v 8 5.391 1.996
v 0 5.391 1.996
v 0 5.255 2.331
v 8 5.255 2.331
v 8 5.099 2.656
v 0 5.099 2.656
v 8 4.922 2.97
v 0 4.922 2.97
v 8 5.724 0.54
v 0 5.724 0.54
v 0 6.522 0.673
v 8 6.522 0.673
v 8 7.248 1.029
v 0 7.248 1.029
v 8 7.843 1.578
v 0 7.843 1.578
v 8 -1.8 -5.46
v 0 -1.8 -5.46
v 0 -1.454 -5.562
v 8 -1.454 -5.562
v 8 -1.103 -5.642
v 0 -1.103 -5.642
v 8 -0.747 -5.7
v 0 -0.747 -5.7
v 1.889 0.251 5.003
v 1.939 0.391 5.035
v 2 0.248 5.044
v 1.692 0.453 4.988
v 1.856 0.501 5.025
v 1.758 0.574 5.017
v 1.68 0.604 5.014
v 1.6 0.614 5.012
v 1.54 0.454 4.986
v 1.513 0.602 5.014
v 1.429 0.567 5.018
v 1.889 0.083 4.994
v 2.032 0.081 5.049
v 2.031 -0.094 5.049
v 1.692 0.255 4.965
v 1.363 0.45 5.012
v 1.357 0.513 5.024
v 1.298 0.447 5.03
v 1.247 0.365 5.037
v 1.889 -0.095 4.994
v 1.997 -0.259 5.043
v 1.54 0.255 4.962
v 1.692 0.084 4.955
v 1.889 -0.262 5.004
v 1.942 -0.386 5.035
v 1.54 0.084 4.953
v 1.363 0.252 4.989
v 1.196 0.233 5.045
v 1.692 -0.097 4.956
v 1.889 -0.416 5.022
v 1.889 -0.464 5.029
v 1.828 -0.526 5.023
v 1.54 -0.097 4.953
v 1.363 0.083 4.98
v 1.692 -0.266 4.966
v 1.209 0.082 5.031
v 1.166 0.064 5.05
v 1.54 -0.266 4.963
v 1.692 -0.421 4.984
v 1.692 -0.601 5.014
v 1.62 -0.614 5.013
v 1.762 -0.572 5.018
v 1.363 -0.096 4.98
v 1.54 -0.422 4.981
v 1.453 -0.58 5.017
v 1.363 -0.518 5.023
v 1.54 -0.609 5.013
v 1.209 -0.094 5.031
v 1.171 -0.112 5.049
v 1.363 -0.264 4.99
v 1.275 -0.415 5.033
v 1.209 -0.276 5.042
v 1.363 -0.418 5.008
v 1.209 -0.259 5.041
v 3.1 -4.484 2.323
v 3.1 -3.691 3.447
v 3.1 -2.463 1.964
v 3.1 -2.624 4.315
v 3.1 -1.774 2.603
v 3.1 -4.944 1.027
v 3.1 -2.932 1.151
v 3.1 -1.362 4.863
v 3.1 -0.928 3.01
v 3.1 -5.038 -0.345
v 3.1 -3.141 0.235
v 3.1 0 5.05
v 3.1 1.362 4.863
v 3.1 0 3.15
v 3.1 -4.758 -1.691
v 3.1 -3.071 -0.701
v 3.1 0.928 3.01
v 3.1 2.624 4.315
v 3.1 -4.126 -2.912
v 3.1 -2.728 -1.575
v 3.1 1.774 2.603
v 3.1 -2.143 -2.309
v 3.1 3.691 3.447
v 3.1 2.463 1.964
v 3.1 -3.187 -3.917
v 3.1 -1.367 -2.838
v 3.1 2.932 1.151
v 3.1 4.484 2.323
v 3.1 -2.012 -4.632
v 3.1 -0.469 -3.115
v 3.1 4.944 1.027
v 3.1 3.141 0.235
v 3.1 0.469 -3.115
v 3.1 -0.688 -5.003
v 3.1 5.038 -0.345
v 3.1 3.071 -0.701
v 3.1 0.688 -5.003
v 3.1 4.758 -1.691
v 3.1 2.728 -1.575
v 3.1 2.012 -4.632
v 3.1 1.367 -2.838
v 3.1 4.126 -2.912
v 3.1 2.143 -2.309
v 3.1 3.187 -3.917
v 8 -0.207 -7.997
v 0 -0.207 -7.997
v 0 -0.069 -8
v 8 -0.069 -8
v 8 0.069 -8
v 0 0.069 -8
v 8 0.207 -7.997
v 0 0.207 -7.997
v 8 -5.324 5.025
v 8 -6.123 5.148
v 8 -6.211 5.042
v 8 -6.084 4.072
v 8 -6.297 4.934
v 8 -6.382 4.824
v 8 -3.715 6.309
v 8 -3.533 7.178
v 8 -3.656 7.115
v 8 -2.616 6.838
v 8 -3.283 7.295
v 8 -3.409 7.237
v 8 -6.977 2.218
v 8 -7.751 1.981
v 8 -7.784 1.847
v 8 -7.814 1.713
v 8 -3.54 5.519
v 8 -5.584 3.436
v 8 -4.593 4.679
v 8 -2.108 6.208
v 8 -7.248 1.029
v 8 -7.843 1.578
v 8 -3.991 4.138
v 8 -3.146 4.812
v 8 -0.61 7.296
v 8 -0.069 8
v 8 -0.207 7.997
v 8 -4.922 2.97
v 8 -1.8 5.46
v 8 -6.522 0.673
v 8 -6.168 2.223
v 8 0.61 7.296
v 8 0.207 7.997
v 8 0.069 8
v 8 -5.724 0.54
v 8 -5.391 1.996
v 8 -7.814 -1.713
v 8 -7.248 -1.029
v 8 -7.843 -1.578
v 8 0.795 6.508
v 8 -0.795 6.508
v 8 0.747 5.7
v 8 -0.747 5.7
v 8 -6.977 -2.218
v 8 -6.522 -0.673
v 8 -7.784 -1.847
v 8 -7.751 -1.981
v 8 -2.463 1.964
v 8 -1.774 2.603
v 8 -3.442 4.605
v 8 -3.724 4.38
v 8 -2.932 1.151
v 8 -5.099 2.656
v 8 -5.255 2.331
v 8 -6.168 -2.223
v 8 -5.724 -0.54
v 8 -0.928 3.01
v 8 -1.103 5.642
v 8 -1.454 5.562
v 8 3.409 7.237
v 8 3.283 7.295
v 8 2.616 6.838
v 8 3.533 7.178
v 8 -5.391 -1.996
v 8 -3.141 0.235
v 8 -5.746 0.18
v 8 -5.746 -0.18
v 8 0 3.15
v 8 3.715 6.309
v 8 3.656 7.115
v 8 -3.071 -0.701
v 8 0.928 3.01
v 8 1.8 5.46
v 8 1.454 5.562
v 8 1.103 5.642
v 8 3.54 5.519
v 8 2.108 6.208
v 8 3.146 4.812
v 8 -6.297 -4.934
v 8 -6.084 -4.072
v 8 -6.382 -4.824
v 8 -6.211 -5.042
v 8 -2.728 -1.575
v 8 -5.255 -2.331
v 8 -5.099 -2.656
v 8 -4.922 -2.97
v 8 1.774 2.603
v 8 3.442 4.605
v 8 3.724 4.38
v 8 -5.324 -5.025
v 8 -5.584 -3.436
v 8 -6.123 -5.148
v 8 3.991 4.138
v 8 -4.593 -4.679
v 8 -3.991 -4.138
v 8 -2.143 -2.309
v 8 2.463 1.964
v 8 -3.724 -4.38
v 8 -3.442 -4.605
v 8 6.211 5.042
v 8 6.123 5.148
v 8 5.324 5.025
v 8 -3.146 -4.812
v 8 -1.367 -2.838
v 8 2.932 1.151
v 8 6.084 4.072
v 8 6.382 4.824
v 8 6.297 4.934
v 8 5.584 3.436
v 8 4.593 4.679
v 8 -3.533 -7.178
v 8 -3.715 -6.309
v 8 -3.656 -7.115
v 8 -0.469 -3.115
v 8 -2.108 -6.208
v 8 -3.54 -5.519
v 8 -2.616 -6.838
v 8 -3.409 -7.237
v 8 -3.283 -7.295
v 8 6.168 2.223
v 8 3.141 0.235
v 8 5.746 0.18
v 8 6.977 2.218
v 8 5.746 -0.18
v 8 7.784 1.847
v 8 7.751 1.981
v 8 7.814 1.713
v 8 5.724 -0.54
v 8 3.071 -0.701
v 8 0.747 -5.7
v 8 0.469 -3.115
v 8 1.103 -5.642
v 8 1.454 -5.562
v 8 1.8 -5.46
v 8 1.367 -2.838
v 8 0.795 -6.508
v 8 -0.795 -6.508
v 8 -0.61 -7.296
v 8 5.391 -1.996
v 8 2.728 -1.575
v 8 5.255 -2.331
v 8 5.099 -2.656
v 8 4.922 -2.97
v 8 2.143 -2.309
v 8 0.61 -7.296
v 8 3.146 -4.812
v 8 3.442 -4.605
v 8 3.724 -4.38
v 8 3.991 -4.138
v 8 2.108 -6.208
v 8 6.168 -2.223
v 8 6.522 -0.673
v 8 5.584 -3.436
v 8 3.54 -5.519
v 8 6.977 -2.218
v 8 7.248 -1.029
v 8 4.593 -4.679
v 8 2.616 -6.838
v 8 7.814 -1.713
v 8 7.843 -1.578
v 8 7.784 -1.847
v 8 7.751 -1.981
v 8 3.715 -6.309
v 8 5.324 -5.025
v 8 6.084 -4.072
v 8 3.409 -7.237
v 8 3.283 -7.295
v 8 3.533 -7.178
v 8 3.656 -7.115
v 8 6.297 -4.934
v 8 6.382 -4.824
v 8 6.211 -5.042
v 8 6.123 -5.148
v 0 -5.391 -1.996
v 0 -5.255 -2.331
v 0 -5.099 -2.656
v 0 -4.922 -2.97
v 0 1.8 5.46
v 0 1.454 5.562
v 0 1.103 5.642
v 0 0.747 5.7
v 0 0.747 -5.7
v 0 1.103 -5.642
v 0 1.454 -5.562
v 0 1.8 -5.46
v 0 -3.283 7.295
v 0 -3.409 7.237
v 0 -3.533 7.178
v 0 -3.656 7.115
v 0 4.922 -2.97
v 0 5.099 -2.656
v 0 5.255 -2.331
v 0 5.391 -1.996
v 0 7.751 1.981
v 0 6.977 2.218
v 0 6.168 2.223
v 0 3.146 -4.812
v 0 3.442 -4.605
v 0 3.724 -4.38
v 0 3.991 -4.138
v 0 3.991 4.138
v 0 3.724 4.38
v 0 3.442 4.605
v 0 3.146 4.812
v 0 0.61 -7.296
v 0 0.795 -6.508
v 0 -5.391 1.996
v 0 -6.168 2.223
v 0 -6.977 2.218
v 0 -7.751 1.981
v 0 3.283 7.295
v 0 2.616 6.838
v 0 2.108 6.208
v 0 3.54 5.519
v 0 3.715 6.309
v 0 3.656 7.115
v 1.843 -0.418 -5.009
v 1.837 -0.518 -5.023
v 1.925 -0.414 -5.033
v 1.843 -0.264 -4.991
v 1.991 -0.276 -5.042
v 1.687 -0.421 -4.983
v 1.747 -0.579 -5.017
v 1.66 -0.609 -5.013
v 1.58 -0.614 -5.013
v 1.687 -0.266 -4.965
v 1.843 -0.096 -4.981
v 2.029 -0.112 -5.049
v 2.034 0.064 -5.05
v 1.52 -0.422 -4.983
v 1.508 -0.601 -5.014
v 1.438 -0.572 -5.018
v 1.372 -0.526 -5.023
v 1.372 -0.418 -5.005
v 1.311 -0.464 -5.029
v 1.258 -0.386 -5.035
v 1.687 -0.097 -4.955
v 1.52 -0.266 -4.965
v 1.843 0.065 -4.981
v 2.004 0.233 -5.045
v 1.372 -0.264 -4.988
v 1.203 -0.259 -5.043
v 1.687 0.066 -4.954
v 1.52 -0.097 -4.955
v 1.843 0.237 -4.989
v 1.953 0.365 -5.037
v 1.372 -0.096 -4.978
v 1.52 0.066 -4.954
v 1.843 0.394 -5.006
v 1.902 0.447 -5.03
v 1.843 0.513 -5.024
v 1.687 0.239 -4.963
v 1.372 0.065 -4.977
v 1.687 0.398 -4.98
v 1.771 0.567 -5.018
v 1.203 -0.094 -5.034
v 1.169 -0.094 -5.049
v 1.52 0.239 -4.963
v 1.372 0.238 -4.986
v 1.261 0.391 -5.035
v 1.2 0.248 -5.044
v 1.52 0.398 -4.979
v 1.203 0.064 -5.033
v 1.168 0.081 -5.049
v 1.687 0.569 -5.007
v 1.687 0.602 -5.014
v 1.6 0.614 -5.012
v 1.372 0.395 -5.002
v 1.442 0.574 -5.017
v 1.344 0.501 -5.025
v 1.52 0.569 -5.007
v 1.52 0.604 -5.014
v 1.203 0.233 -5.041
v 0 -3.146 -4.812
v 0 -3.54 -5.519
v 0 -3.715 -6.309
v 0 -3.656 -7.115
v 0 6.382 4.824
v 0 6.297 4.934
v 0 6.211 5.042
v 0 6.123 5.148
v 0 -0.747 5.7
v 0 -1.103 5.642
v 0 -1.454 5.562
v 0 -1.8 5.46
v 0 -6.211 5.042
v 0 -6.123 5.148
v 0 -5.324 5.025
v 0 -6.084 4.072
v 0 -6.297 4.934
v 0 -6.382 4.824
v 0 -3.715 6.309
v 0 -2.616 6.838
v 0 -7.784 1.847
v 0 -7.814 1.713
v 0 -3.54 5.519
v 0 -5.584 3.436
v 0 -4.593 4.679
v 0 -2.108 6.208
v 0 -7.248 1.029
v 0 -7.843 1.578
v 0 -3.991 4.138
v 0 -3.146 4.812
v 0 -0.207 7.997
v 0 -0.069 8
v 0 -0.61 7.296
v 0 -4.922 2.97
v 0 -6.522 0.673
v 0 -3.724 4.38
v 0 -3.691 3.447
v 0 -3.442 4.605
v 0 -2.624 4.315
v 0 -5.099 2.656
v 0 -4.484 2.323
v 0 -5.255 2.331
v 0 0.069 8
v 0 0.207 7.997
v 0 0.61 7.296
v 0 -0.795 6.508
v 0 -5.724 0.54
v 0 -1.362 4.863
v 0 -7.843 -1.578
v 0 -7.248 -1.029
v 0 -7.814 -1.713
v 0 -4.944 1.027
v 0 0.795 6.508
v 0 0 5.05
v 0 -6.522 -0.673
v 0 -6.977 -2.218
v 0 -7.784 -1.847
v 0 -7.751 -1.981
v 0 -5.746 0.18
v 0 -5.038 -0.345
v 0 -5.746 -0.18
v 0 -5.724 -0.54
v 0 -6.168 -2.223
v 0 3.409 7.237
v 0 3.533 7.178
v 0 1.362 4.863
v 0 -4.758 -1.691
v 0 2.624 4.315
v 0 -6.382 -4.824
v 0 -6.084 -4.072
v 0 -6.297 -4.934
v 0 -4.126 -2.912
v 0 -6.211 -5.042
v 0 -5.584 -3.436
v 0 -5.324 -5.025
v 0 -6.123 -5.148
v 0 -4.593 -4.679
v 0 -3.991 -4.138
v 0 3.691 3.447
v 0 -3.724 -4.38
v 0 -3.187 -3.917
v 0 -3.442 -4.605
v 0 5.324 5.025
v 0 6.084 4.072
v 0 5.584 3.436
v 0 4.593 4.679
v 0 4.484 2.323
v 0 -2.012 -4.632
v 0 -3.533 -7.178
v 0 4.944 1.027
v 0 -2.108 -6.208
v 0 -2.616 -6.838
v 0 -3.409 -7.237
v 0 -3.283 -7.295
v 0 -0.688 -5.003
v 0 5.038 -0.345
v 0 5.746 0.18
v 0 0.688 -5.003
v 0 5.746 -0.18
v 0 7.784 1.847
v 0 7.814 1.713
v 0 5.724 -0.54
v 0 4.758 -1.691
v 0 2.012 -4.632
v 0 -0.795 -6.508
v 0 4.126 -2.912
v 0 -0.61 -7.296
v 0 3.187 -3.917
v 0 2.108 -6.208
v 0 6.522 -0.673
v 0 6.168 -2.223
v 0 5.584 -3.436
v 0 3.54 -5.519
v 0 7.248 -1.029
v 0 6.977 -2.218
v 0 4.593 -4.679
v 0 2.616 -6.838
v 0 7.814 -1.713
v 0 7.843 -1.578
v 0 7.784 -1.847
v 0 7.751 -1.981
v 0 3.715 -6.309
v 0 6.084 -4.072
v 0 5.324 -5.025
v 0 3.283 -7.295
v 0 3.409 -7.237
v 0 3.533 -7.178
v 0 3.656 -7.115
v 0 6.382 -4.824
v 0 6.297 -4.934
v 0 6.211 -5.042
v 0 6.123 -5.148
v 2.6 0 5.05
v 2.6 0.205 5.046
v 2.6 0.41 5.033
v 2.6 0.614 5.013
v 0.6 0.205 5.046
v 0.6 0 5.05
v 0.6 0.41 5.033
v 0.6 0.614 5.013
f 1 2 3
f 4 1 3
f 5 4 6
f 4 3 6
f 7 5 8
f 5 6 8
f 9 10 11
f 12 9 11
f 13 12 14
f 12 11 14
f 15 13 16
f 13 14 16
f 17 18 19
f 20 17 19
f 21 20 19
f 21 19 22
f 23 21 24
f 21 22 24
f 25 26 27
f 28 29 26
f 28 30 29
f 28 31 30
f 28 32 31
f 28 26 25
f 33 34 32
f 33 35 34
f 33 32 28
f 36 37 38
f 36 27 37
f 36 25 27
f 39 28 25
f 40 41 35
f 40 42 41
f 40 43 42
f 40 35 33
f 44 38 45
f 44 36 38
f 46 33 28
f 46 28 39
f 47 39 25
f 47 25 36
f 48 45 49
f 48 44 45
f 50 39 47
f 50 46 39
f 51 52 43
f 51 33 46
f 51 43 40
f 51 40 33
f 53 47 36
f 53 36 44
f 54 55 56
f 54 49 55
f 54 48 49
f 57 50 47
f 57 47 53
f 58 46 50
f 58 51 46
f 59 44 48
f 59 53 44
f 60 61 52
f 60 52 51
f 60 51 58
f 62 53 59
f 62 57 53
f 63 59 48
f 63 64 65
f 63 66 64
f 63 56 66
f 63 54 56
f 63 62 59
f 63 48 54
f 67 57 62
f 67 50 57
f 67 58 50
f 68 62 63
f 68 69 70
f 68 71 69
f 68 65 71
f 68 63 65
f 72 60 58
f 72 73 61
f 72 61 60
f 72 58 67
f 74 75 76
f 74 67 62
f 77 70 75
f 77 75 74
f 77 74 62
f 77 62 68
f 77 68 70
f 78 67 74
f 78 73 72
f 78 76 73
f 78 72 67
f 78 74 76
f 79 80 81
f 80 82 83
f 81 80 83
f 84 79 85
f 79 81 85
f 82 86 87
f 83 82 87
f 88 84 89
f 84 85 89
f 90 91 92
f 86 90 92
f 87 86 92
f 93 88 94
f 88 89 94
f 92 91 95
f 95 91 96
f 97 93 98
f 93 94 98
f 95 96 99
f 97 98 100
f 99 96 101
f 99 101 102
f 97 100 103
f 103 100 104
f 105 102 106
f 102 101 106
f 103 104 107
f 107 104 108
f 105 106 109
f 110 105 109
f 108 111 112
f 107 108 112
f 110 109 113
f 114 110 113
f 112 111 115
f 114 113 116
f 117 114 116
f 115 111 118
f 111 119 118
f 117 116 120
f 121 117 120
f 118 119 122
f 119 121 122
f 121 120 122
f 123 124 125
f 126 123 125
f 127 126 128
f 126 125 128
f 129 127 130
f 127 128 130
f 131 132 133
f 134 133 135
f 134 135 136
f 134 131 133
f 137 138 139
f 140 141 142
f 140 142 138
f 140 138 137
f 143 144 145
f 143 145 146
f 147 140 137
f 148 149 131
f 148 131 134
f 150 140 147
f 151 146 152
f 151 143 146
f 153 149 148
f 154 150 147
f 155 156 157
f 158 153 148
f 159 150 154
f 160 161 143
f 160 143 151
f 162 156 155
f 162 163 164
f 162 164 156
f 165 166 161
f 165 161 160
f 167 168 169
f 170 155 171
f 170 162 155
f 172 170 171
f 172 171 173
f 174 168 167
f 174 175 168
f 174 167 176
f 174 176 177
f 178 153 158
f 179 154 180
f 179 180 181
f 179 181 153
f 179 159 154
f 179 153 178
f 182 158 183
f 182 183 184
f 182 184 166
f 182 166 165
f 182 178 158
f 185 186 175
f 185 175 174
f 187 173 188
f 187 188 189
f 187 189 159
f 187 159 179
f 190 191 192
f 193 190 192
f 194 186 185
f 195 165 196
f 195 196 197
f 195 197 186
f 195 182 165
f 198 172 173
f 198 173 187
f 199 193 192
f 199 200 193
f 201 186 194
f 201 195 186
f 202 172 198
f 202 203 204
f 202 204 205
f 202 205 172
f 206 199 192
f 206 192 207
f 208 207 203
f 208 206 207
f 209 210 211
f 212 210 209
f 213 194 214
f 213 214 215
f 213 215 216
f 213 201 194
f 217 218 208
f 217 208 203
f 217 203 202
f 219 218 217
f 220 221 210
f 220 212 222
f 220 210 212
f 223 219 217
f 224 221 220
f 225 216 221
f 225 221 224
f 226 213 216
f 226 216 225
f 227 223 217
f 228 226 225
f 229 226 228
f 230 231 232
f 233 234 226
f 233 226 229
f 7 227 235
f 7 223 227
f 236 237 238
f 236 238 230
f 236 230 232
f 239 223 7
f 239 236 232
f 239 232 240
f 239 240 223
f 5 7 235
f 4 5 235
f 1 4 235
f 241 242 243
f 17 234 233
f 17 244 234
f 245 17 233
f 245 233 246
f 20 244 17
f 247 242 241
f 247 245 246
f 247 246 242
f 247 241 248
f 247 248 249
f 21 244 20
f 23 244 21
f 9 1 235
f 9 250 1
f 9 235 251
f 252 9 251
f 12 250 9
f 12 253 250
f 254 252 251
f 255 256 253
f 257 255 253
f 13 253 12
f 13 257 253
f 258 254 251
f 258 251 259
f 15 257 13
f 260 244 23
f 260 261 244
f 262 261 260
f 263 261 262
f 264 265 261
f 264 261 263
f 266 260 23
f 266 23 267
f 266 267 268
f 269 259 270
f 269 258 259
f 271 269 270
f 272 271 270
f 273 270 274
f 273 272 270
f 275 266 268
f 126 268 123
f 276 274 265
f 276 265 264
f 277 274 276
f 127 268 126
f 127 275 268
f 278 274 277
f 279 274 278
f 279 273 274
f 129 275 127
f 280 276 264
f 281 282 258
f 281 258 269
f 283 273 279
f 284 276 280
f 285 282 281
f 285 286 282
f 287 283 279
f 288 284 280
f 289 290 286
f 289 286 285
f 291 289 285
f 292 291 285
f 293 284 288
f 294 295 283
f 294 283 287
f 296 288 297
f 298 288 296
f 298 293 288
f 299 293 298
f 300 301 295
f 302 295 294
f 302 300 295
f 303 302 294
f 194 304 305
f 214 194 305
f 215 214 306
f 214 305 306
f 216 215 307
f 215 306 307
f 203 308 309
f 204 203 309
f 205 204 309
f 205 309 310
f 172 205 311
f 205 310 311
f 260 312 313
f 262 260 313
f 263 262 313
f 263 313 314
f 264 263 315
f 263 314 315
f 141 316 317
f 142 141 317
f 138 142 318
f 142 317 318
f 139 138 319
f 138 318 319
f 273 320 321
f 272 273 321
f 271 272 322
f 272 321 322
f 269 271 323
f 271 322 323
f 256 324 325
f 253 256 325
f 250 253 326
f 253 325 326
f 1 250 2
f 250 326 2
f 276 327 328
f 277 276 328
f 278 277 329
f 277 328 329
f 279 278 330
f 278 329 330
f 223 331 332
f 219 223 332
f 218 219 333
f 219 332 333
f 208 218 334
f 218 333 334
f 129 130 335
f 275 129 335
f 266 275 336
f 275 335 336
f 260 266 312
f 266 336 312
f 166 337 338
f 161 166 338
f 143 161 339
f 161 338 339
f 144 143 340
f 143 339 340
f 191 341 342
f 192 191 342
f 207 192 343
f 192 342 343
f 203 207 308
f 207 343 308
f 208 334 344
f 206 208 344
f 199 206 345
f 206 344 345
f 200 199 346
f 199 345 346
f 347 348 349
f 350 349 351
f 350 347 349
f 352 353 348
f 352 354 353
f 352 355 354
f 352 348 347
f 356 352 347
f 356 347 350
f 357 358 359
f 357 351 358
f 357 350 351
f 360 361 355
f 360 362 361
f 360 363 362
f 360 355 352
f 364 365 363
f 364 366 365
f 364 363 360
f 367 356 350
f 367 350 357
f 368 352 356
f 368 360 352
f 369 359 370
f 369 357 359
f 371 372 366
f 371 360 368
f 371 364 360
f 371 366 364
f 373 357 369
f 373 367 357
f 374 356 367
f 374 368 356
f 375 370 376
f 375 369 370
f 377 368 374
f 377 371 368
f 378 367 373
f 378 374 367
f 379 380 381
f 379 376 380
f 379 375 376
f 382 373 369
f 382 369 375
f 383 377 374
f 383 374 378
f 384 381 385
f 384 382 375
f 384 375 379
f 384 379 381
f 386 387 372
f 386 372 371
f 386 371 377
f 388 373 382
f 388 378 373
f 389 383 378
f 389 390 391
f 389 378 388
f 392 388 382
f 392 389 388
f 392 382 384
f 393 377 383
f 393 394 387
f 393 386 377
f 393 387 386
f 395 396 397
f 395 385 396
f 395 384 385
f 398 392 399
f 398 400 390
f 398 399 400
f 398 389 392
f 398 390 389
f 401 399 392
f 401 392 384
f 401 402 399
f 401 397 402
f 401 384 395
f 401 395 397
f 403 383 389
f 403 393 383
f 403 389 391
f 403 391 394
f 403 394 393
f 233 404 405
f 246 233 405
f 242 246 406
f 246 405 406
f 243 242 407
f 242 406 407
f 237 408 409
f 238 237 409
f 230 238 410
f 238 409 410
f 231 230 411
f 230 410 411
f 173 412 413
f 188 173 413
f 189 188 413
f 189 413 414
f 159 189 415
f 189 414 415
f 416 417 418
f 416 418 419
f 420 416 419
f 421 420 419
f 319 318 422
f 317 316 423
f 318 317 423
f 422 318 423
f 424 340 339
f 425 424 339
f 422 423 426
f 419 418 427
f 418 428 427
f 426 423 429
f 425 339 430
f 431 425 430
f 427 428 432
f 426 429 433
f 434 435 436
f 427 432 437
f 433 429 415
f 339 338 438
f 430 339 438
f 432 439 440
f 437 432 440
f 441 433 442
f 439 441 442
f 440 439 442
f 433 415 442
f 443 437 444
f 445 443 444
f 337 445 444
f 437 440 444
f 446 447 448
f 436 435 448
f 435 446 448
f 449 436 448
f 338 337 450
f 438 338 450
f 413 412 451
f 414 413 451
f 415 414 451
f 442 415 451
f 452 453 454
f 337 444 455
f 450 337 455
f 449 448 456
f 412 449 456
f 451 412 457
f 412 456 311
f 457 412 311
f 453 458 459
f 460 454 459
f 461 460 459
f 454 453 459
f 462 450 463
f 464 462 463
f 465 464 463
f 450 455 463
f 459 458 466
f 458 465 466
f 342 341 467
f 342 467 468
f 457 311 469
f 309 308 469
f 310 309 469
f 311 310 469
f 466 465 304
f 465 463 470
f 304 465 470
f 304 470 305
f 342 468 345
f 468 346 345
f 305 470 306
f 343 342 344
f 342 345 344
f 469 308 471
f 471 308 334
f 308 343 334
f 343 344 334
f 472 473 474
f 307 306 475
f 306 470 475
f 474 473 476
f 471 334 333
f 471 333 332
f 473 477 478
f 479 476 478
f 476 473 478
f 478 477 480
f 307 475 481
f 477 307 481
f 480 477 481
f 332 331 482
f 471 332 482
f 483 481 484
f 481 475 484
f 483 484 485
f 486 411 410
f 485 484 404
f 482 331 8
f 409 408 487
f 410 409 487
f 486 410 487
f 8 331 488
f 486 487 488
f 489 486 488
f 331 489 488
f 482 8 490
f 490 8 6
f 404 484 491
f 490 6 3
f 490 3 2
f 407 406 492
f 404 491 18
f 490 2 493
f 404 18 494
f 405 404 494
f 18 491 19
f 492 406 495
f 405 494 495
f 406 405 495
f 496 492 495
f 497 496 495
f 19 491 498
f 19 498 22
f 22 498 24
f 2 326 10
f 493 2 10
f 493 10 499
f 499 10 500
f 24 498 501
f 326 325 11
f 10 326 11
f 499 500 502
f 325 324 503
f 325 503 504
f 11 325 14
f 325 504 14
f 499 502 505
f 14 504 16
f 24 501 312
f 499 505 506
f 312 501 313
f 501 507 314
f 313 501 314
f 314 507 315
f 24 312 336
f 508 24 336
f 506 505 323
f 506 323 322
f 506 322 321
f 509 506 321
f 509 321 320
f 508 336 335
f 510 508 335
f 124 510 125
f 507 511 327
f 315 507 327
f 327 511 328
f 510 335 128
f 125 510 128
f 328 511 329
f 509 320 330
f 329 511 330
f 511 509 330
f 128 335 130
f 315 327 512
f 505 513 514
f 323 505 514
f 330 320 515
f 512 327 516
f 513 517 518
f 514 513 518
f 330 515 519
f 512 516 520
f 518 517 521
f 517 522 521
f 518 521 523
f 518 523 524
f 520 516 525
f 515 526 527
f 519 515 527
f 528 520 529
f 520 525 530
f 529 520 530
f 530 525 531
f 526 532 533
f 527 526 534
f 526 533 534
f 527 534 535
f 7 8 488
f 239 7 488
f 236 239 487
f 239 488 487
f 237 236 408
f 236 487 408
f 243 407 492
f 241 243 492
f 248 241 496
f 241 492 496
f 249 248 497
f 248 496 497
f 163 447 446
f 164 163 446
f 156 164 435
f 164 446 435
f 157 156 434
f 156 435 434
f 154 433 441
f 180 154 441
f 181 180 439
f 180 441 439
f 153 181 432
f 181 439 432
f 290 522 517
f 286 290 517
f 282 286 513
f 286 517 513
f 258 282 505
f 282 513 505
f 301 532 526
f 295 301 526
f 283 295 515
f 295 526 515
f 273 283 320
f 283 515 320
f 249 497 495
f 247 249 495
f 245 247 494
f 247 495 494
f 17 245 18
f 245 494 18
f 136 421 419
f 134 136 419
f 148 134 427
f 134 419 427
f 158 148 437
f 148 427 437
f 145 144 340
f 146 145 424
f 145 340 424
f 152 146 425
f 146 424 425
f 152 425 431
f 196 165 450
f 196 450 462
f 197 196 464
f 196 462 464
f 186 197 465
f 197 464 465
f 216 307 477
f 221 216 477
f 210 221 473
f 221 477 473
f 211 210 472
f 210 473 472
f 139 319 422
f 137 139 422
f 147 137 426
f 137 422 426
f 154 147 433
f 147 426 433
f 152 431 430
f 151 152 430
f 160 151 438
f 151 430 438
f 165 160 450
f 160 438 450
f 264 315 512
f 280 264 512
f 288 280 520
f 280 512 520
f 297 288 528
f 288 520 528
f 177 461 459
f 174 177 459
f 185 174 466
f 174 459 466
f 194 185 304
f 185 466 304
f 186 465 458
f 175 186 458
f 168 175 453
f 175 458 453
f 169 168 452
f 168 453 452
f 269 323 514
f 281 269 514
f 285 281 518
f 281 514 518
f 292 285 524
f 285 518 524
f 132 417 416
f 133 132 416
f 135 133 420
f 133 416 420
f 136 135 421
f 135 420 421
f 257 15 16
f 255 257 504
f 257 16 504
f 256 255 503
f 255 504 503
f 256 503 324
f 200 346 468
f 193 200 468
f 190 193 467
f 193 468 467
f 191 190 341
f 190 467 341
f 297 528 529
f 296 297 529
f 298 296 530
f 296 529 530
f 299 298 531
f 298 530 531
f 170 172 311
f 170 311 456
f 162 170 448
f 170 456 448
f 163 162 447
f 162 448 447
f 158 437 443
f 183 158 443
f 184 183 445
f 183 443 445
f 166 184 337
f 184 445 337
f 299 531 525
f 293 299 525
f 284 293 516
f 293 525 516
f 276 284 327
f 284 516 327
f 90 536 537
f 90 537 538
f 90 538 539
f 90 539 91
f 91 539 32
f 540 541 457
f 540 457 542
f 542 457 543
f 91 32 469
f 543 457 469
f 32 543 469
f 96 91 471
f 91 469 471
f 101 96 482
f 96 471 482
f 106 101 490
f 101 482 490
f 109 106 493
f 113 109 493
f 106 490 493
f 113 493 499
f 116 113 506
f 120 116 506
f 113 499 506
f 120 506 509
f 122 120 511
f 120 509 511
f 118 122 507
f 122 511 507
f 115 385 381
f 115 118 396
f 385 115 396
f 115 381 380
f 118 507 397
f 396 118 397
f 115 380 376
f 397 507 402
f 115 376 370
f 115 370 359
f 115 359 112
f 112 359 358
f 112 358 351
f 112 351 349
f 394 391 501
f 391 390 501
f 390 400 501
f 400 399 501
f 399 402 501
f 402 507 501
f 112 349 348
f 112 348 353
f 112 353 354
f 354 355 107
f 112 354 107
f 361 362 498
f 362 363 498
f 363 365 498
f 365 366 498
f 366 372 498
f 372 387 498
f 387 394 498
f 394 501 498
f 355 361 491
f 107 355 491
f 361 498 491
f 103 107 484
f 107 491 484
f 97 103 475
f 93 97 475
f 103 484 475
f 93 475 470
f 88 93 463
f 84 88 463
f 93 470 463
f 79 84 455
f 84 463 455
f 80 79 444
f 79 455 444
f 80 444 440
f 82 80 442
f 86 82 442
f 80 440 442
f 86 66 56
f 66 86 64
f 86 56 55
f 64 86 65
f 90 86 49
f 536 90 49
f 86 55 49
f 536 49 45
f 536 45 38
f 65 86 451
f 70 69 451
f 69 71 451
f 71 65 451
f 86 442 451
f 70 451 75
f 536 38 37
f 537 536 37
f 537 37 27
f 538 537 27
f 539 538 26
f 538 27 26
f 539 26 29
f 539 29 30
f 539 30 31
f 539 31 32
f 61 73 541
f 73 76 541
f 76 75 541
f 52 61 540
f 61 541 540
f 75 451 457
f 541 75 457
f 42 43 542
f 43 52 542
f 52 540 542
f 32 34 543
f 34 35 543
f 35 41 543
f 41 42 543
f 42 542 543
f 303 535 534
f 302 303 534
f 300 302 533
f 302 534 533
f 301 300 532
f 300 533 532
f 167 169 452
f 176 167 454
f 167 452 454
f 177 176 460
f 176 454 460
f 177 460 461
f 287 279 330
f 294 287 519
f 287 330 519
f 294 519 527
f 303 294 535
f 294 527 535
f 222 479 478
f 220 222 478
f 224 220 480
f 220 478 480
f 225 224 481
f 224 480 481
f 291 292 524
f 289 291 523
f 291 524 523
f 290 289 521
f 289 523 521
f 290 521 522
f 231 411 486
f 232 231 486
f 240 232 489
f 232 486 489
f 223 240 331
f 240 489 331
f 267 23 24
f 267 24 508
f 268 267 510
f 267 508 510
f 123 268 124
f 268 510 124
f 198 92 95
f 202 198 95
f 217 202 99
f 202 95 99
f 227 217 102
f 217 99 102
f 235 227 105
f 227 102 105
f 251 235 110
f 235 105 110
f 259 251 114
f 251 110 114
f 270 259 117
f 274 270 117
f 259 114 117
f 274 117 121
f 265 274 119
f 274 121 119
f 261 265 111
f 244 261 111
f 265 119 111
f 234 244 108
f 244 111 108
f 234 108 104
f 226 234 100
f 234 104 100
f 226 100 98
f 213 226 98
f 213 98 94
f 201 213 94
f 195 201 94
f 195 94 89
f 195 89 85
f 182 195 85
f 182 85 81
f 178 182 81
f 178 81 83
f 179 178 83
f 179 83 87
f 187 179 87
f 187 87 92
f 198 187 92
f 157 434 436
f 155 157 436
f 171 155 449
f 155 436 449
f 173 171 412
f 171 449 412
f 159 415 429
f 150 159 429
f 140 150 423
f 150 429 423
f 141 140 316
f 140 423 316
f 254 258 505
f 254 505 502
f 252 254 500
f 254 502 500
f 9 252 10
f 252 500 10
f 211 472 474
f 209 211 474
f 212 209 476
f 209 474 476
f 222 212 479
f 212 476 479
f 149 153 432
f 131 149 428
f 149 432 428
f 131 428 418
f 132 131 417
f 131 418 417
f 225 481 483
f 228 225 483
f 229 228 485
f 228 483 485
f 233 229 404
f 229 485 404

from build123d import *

# Parameters (mm, degrees)
BOSS_EXTRUDE1_START       = -4.9
BOSS_EXTRUDE1_DEPTH       = 4.9
BOSS_EXTRUDE1_START_2     = -8
BOSS_EXTRUDE1_2_OUTLINE_R = 5
BOSS_EXTRUDE1_2_DEPTH     = 3.1
SKETCH2_R                 = 5.05
CUT_EXTRUDE1_DEPTH        = 3.1
SKETCH3_R                 = 3.25
CUT_EXTRUDE2_DEPTH        = 13.227872143
SKETCH4_R                 = 4
CUT_EXTRUDE3_DEPTH        = 10
SKETCH5_R                 = 4
SKETCH5_R_2               = 3
BOSS_EXTRUDE2_DEPTH       = 4.9
BOSS_EXTRUDE3_DEPTH       = 1
BOSS_EXTRUDE3_DEPTH_BACK  = 1
FILLET1_R                 = 1
SKETCH8_R                 = 3.15
CUT_EXTRUDE4_DEPTH        = 10


with BuildPart() as part:
    # Boss-Extrude1: read off the stored shape, not the designer's step
    # Boss-Extrude1 outline → Boss-Extrude1 (new body)
    with BuildSketch(Plane(origin=(8, 0, 0), x_dir=(0, 0, -1), z_dir=(1, 0, 0)).offset(BOSS_EXTRUDE1_START)):
        with BuildLine():
            ThreePointArc((-7.295176575, -3.283351754), (-7.207750943, -3.471069913), (-7.115495966, -3.656462382))
            ThreePointArc((-7.115495966, -3.656462382), (-5.907248739, -3.655787226), (-4.811777955, -3.146075955))
            ThreePointArc((-4.811777955, -3.146075955), (-4.494749193, -3.584442871), (-4.137918587, -3.991068875))
            ThreePointArc((-4.137918587, -3.991068875), (-4.878615514, -4.945652492), (-5.148134044, -6.123456202))
            ThreePointArc((-5.148134044, -6.123456202), (-4.987918415, -6.25465186), (-4.824360775, -6.381656769))
            ThreePointArc((-4.824360775, -6.381656769), (-3.736060578, -5.856809649), (-2.970230937, -4.922268702))
            ThreePointArc((-2.970230937, -4.922268702), (-2.494397616, -5.179670022), (-1.996475938, -5.391204395))
            ThreePointArc((-1.996475938, -5.391204395), (-2.249642501, -6.572630868), (-1.981440428, -7.750735051))
            ThreePointArc((-1.981440428, -7.750735051), (-1.780167471, -7.799423297), (-1.577701765, -7.842885766))
            ThreePointArc((-1.577701765, -7.842885766), (-0.824899799, -6.897819092), (-0.540393256, -5.723545765))
            ThreePointArc((-0.540393256, -5.723545765), (0, -5.749), (0.540393256, -5.723545765))
            ThreePointArc((0.540393256, -5.723545765), (0.824899799, -6.897819092), (1.577701765, -7.842885766))
            ThreePointArc((1.577701765, -7.842885766), (1.780167471, -7.799423297), (1.981440428, -7.750735051))
            ThreePointArc((1.981440428, -7.750735051), (2.249642501, -6.572630868), (1.996475938, -5.391204395))
            ThreePointArc((1.996475938, -5.391204395), (2.494397616, -5.179670022), (2.970230937, -4.922268702))
            ThreePointArc((2.970230937, -4.922268702), (3.736060578, -5.856809649), (4.824360775, -6.381656769))
            ThreePointArc((4.824360775, -6.381656769), (4.987918415, -6.25465186), (5.148134044, -6.123456202))
            ThreePointArc((5.148134044, -6.123456202), (4.878615514, -4.945652492), (4.137918587, -3.991068875))
            ThreePointArc((4.137918587, -3.991068875), (4.494749193, -3.584442871), (4.811777955, -3.146075955))
            ThreePointArc((4.811777955, -3.146075955), (5.907248739, -3.655787226), (7.115495966, -3.656462382))
            ThreePointArc((7.115495966, -3.656462382), (7.207750943, -3.471069913), (7.295176575, -3.283351754))
            ThreePointArc((7.295176575, -3.283351754), (6.541318892, -2.339126986), (5.459795711, -1.800453218))
            ThreePointArc((5.459795711, -1.800453218), (5.604860567, -1.27927285), (5.700293335, -0.746764281))
            ThreePointArc((5.700293335, -0.746764281), (6.90843384, -0.730691307), (7.997319916, -0.207060777))
            ThreePointArc((7.997319916, -0.207060777), (8, 0), (7.997319916, 0.207060777))
            ThreePointArc((7.997319916, 0.207060777), (6.90843384, 0.730691307), (5.700293335, 0.746764281))
            ThreePointArc((5.700293335, 0.746764281), (5.604860567, 1.27927285), (5.459795711, 1.800453218))
            ThreePointArc((5.459795711, 1.800453218), (6.541318892, 2.339126986), (7.295176575, 3.283351754))
            ThreePointArc((7.295176575, 3.283351754), (7.207750943, 3.471069913), (7.115495966, 3.656462382))
            ThreePointArc((7.115495966, 3.656462382), (5.907248739, 3.655787226), (4.811777955, 3.146075955))
            ThreePointArc((4.811777955, 3.146075955), (4.494749193, 3.584442871), (4.137918587, 3.991068875))
            ThreePointArc((4.137918587, 3.991068875), (4.878615514, 4.945652492), (5.148134044, 6.123456202))
            ThreePointArc((5.148134044, 6.123456202), (4.987918415, 6.25465186), (4.824360775, 6.381656769))
            ThreePointArc((4.824360775, 6.381656769), (3.736060578, 5.856809649), (2.970230937, 4.922268702))
            ThreePointArc((2.970230937, 4.922268702), (2.494397616, 5.179670022), (1.996475938, 5.391204395))
            ThreePointArc((1.996475938, 5.391204395), (2.249642501, 6.572630868), (1.981440428, 7.750735051))
            ThreePointArc((1.981440428, 7.750735051), (1.780167471, 7.799423297), (1.577701765, 7.842885766))
            ThreePointArc((1.577701765, 7.842885766), (0.824899799, 6.897819092), (0.540393256, 5.723545765))
            ThreePointArc((0.540393256, 5.723545765), (0, 5.749), (-0.540393256, 5.723545765))
            ThreePointArc((-0.540393256, 5.723545765), (-0.824899799, 6.897819092), (-1.577701765, 7.842885766))
            ThreePointArc((-1.577701765, 7.842885766), (-1.780167471, 7.799423297), (-1.981440428, 7.750735051))
            ThreePointArc((-1.981440428, 7.750735051), (-2.249642501, 6.572630868), (-1.996475938, 5.391204395))
            ThreePointArc((-1.996475938, 5.391204395), (-2.494397616, 5.179670022), (-2.970230937, 4.922268702))
            ThreePointArc((-2.970230937, 4.922268702), (-3.736060578, 5.856809649), (-4.824360775, 6.381656769))
            ThreePointArc((-4.824360775, 6.381656769), (-4.987918415, 6.25465186), (-5.148134044, 6.123456202))
            ThreePointArc((-5.148134044, 6.123456202), (-4.878615514, 4.945652492), (-4.137918587, 3.991068875))
            ThreePointArc((-4.137918587, 3.991068875), (-4.494749193, 3.584442871), (-4.811777955, 3.146075955))
            ThreePointArc((-4.811777955, 3.146075955), (-5.907248739, 3.655787226), (-7.115495966, 3.656462382))
            ThreePointArc((-7.115495966, 3.656462382), (-7.207750943, 3.471069913), (-7.295176575, 3.283351754))
            ThreePointArc((-7.295176575, 3.283351754), (-6.541318892, 2.339126986), (-5.459795711, 1.800453218))
            ThreePointArc((-5.459795711, 1.800453218), (-5.604860567, 1.27927285), (-5.700293335, 0.746764281))
            ThreePointArc((-5.700293335, 0.746764281), (-6.90843384, 0.730691307), (-7.997319916, 0.207060777))
            ThreePointArc((-7.997319916, 0.207060777), (-8, 0), (-7.997319916, -0.207060777))
            ThreePointArc((-7.997319916, -0.207060777), (-6.90843384, -0.730691307), (-5.700293335, -0.746764281))
            ThreePointArc((-5.700293335, -0.746764281), (-5.604860567, -1.27927285), (-5.459795711, -1.800453218))
            ThreePointArc((-5.459795711, -1.800453218), (-6.541318892, -2.339126986), (-7.295176575, -3.283351754))
        make_face()
    extrude(amount=BOSS_EXTRUDE1_DEPTH)

    # Boss-Extrude1 2 outline → Boss-Extrude1 2 (add)
    with BuildSketch(Plane(origin=(8, 0, 0), x_dir=(0, 0, -1), z_dir=(1, 0, 0)).offset(BOSS_EXTRUDE1_START_2)):
        with BuildLine():
            ThreePointArc((-7.295176575, -3.283351754), (-7.207750943, -3.471069913), (-7.115495966, -3.656462382))
            ThreePointArc((-7.115495966, -3.656462382), (-5.907248739, -3.655787226), (-4.811777955, -3.146075955))
            ThreePointArc((-4.811777955, -3.146075955), (-4.494749193, -3.584442871), (-4.137918587, -3.991068875))
            ThreePointArc((-4.137918587, -3.991068875), (-4.878615514, -4.945652492), (-5.148134044, -6.123456202))
            ThreePointArc((-5.148134044, -6.123456202), (-4.987918415, -6.25465186), (-4.824360775, -6.381656769))
            ThreePointArc((-4.824360775, -6.381656769), (-3.736060578, -5.856809649), (-2.970230937, -4.922268702))
            ThreePointArc((-2.970230937, -4.922268702), (-2.494397616, -5.179670022), (-1.996475938, -5.391204395))
            ThreePointArc((-1.996475938, -5.391204395), (-2.249642501, -6.572630868), (-1.981440428, -7.750735051))
            ThreePointArc((-1.981440428, -7.750735051), (-1.780167471, -7.799423297), (-1.577701765, -7.842885766))
            ThreePointArc((-1.577701765, -7.842885766), (-0.824899799, -6.897819092), (-0.540393256, -5.723545765))
            ThreePointArc((-0.540393256, -5.723545765), (0, -5.749), (0.540393256, -5.723545765))
            ThreePointArc((0.540393256, -5.723545765), (0.824899799, -6.897819092), (1.577701765, -7.842885766))
            ThreePointArc((1.577701765, -7.842885766), (1.780167471, -7.799423297), (1.981440428, -7.750735051))
            ThreePointArc((1.981440428, -7.750735051), (2.249642501, -6.572630868), (1.996475938, -5.391204395))
            ThreePointArc((1.996475938, -5.391204395), (2.494397616, -5.179670022), (2.970230937, -4.922268702))
            ThreePointArc((2.970230937, -4.922268702), (3.736060578, -5.856809649), (4.824360775, -6.381656769))
            ThreePointArc((4.824360775, -6.381656769), (4.987918415, -6.25465186), (5.148134044, -6.123456202))
            ThreePointArc((5.148134044, -6.123456202), (4.878615514, -4.945652492), (4.137918587, -3.991068875))
            ThreePointArc((4.137918587, -3.991068875), (4.494749193, -3.584442871), (4.811777955, -3.146075955))
            ThreePointArc((4.811777955, -3.146075955), (5.907248739, -3.655787226), (7.115495966, -3.656462382))
            ThreePointArc((7.115495966, -3.656462382), (7.207750943, -3.471069913), (7.295176575, -3.283351754))
            ThreePointArc((7.295176575, -3.283351754), (6.541318892, -2.339126986), (5.459795711, -1.800453218))
            ThreePointArc((5.459795711, -1.800453218), (5.604860567, -1.27927285), (5.700293335, -0.746764281))
            ThreePointArc((5.700293335, -0.746764281), (6.90843384, -0.730691307), (7.997319916, -0.207060777))
            ThreePointArc((7.997319916, -0.207060777), (8, 0), (7.997319916, 0.207060777))
            ThreePointArc((7.997319916, 0.207060777), (6.90843384, 0.730691307), (5.700293335, 0.746764281))
            ThreePointArc((5.700293335, 0.746764281), (5.604860567, 1.27927285), (5.459795711, 1.800453218))
            ThreePointArc((5.459795711, 1.800453218), (6.541318892, 2.339126986), (7.295176575, 3.283351754))
            ThreePointArc((7.295176575, 3.283351754), (7.207750943, 3.471069913), (7.115495966, 3.656462382))
            ThreePointArc((7.115495966, 3.656462382), (5.907248739, 3.655787226), (4.811777955, 3.146075955))
            ThreePointArc((4.811777955, 3.146075955), (4.494749193, 3.584442871), (4.137918587, 3.991068875))
            ThreePointArc((4.137918587, 3.991068875), (4.878615514, 4.945652492), (5.148134044, 6.123456202))
            ThreePointArc((5.148134044, 6.123456202), (4.987918415, 6.25465186), (4.824360775, 6.381656769))
            ThreePointArc((4.824360775, 6.381656769), (3.736060578, 5.856809649), (2.970230937, 4.922268702))
            ThreePointArc((2.970230937, 4.922268702), (2.494397616, 5.179670022), (1.996475938, 5.391204395))
            ThreePointArc((1.996475938, 5.391204395), (2.249642501, 6.572630868), (1.981440428, 7.750735051))
            ThreePointArc((1.981440428, 7.750735051), (1.780167471, 7.799423297), (1.577701765, 7.842885766))
            ThreePointArc((1.577701765, 7.842885766), (0.824899799, 6.897819092), (0.540393256, 5.723545765))
            ThreePointArc((0.540393256, 5.723545765), (0, 5.749), (-0.540393256, 5.723545765))
            ThreePointArc((-0.540393256, 5.723545765), (-0.824899799, 6.897819092), (-1.577701765, 7.842885766))
            ThreePointArc((-1.577701765, 7.842885766), (-1.780167471, 7.799423297), (-1.981440428, 7.750735051))
            ThreePointArc((-1.981440428, 7.750735051), (-2.249642501, 6.572630868), (-1.996475938, 5.391204395))
            ThreePointArc((-1.996475938, 5.391204395), (-2.494397616, 5.179670022), (-2.970230937, 4.922268702))
            ThreePointArc((-2.970230937, 4.922268702), (-3.736060578, 5.856809649), (-4.824360775, 6.381656769))
            ThreePointArc((-4.824360775, 6.381656769), (-4.987918415, 6.25465186), (-5.148134044, 6.123456202))
            ThreePointArc((-5.148134044, 6.123456202), (-4.878615514, 4.945652492), (-4.137918587, 3.991068875))
            ThreePointArc((-4.137918587, 3.991068875), (-4.494749193, 3.584442871), (-4.811777955, 3.146075955))
            ThreePointArc((-4.811777955, 3.146075955), (-5.907248739, 3.655787226), (-7.115495966, 3.656462382))
            ThreePointArc((-7.115495966, 3.656462382), (-7.207750943, 3.471069913), (-7.295176575, 3.283351754))
            ThreePointArc((-7.295176575, 3.283351754), (-6.541318892, 2.339126986), (-5.459795711, 1.800453218))
            ThreePointArc((-5.459795711, 1.800453218), (-5.604860567, 1.27927285), (-5.700293335, 0.746764281))
            ThreePointArc((-5.700293335, 0.746764281), (-6.90843384, 0.730691307), (-7.997319916, 0.207060777))
            ThreePointArc((-7.997319916, 0.207060777), (-8, 0), (-7.997319916, -0.207060777))
            ThreePointArc((-7.997319916, -0.207060777), (-6.90843384, -0.730691307), (-5.700293335, -0.746764281))
            ThreePointArc((-5.700293335, -0.746764281), (-5.604860567, -1.27927285), (-5.459795711, -1.800453218))
            ThreePointArc((-5.459795711, -1.800453218), (-6.541318892, -2.339126986), (-7.295176575, -3.283351754))
        make_face()
        Circle(BOSS_EXTRUDE1_2_OUTLINE_R, mode=Mode.SUBTRACT)
    extrude(amount=BOSS_EXTRUDE1_2_DEPTH)

    # Sketch2 → Cut-Extrude1 (cut)
    with BuildSketch(Plane.ZY):
        Circle(SKETCH2_R)
    extrude(amount=-CUT_EXTRUDE1_DEPTH, mode=Mode.SUBTRACT)

    # Sketch3 → Cut-Extrude2 (cut, through all)
    with BuildSketch(Plane.ZY.offset(-3.1)):
        Circle(SKETCH3_R)
    extrude(amount=-CUT_EXTRUDE2_DEPTH, mode=Mode.SUBTRACT)

    # Sketch4 → Cut-Extrude3 (cut)
    with BuildSketch(Plane(origin=(8, 0, 0), x_dir=(0, 0, -1), z_dir=(1, 0, 0))):
        Circle(SKETCH4_R)
    extrude(amount=-CUT_EXTRUDE3_DEPTH, mode=Mode.SUBTRACT)

    # Sketch5 → Boss-Extrude2 (add)
    with BuildSketch(Plane(origin=(8, 0, 0), x_dir=(0, 0, -1), z_dir=(1, 0, 0))):
        Circle(SKETCH5_R)
        Circle(SKETCH5_R_2, mode=Mode.SUBTRACT)
    extrude(amount=-BOSS_EXTRUDE2_DEPTH)

    # Sketch7 → Boss-Extrude3 (add, two sides: drawn at the far end of the back side and taken through both)
    with BuildSketch(Plane.ZY.offset(-1.6).offset(-BOSS_EXTRUDE3_DEPTH_BACK)):
        with BuildLine():
            ThreePointArc((5.096691895, -0.934506311), (5.181657101, 0), (5.096691895, 0.934506311))
            ThreePointArc((5.096691895, 0.934506311), (4.95, 0), (5.096691895, -0.934506311))
        make_face()
        with BuildLine():
            ThreePointArc((-5.096691895, -0.934506311), (-4.95, 0), (-5.096691895, 0.934506311))
            ThreePointArc((-5.096691895, 0.934506311), (-5.181657101, 0), (-5.096691895, -0.934506311))
        make_face()
    extrude(amount=BOSS_EXTRUDE3_DEPTH + BOSS_EXTRUDE3_DEPTH_BACK)

    # Fillet1
    # the kernel refuses this fillet: 1 mm, written as the material it takes off along each edge
    with BuildSketch(Plane(origin=(0.6, 0, 8), x_dir=(0, 0.853406197512974, -0.5212464503921795), z_dir=(0, 0.5212464503921795, 0.853406197512974))) as fillet1_piece_1_section:
        with BuildLine():
            CenterArc((3.05 - FILLET1_R, -FILLET1_R), FILLET1_R, 0, 90)
            Line((3.05, -FILLET1_R), (3.05, 0))
            Line((3.05, 0), (3.05 - FILLET1_R, 0))
        make_face()
    fillet1_piece_1 = revolve(axis=Axis((0.6, 0, 8), (-1, 0, 0)), revolution_arc=117.16820376, mode=Mode.PRIVATE)
    fillet1_piece_1 = fillet1_piece_1 & Plane(origin=(0.6, 0, 0), x_dir=(0, 0, 1), z_dir=(-1, 0, 0)) * Cylinder(5.05, 13, mode=Mode.PRIVATE)
    add(fillet1_piece_1, mode=Mode.SUBTRACT)
    with BuildSketch(Plane(origin=(0.6, 0, -8), x_dir=(0, -0.8534061975130341, 0.521246450392081), z_dir=(0, -0.521246450392081, -0.8534061975130341))) as fillet1_piece_2_section:
        with BuildLine():
            CenterArc((3.05 - FILLET1_R, -FILLET1_R), FILLET1_R, 0, 90)
            Line((3.05 - FILLET1_R, 0), (3.05, 0))
            Line((3.05, 0), (3.05, -FILLET1_R))
        make_face()
    fillet1_piece_2 = revolve(axis=Axis((0.6, 0, -8), (-1, 0, 0)), revolution_arc=117.16820376, mode=Mode.PRIVATE)
    fillet1_piece_2 = fillet1_piece_2 & Plane(origin=(0.6, 0, 0), x_dir=(0, 0, 1), z_dir=(-1, 0, 0)) * Cylinder(5.05, 13, mode=Mode.PRIVATE)
    add(fillet1_piece_2, mode=Mode.SUBTRACT)
    with BuildSketch(Plane(origin=(2.6, 0, -8), x_dir=(0, -0.8534061975130341, 0.521246450392081), z_dir=(0, -0.521246450392081, -0.8534061975130341))) as fillet1_piece_3_section:
        with BuildLine():
            CenterArc((3.05 - FILLET1_R, FILLET1_R), FILLET1_R, 270, 90)
            Line((3.05 - FILLET1_R, 0), (3.05, 0))
            Line((3.05, 0), (3.05, FILLET1_R))
        make_face()
    fillet1_piece_3 = revolve(axis=Axis((2.6, 0, -8), (-1, 0, 0)), revolution_arc=117.16820376, mode=Mode.PRIVATE)
    fillet1_piece_3 = fillet1_piece_3 & Plane(origin=(2.6, 0, 0), x_dir=(0, 0, 1), z_dir=(-1, 0, 0)) * Cylinder(5.05, 13, mode=Mode.PRIVATE)
    add(fillet1_piece_3, mode=Mode.SUBTRACT)
    with BuildSketch(Plane(origin=(2.6, 0, 8), x_dir=(0, 0.853406197512974, -0.5212464503921795), z_dir=(0, 0.5212464503921795, 0.853406197512974))) as fillet1_piece_4_section:
        with BuildLine():
            CenterArc((3.05 - FILLET1_R, FILLET1_R), FILLET1_R, 270, 90)
            Line((3.05 - FILLET1_R, 0), (3.05, 0))
            Line((3.05, 0), (3.05, FILLET1_R))
        make_face()
    fillet1_piece_4 = revolve(axis=Axis((2.6, 0, 8), (-1, 0, 0)), revolution_arc=117.16820376, mode=Mode.PRIVATE)
    fillet1_piece_4 = fillet1_piece_4 & Plane(origin=(2.6, 0, 0), x_dir=(0, 0, 1), z_dir=(-1, 0, 0)) * Cylinder(5.05, 13, mode=Mode.PRIVATE)
    add(fillet1_piece_4, mode=Mode.SUBTRACT)

    # Sketch8 → Cut-Extrude4 (cut)
    with BuildSketch(Plane.ZY.offset(-3.1)):
        Circle(SKETCH8_R)
    extrude(amount=-CUT_EXTRUDE4_DEPTH, mode=Mode.SUBTRACT)


solid = part.part
